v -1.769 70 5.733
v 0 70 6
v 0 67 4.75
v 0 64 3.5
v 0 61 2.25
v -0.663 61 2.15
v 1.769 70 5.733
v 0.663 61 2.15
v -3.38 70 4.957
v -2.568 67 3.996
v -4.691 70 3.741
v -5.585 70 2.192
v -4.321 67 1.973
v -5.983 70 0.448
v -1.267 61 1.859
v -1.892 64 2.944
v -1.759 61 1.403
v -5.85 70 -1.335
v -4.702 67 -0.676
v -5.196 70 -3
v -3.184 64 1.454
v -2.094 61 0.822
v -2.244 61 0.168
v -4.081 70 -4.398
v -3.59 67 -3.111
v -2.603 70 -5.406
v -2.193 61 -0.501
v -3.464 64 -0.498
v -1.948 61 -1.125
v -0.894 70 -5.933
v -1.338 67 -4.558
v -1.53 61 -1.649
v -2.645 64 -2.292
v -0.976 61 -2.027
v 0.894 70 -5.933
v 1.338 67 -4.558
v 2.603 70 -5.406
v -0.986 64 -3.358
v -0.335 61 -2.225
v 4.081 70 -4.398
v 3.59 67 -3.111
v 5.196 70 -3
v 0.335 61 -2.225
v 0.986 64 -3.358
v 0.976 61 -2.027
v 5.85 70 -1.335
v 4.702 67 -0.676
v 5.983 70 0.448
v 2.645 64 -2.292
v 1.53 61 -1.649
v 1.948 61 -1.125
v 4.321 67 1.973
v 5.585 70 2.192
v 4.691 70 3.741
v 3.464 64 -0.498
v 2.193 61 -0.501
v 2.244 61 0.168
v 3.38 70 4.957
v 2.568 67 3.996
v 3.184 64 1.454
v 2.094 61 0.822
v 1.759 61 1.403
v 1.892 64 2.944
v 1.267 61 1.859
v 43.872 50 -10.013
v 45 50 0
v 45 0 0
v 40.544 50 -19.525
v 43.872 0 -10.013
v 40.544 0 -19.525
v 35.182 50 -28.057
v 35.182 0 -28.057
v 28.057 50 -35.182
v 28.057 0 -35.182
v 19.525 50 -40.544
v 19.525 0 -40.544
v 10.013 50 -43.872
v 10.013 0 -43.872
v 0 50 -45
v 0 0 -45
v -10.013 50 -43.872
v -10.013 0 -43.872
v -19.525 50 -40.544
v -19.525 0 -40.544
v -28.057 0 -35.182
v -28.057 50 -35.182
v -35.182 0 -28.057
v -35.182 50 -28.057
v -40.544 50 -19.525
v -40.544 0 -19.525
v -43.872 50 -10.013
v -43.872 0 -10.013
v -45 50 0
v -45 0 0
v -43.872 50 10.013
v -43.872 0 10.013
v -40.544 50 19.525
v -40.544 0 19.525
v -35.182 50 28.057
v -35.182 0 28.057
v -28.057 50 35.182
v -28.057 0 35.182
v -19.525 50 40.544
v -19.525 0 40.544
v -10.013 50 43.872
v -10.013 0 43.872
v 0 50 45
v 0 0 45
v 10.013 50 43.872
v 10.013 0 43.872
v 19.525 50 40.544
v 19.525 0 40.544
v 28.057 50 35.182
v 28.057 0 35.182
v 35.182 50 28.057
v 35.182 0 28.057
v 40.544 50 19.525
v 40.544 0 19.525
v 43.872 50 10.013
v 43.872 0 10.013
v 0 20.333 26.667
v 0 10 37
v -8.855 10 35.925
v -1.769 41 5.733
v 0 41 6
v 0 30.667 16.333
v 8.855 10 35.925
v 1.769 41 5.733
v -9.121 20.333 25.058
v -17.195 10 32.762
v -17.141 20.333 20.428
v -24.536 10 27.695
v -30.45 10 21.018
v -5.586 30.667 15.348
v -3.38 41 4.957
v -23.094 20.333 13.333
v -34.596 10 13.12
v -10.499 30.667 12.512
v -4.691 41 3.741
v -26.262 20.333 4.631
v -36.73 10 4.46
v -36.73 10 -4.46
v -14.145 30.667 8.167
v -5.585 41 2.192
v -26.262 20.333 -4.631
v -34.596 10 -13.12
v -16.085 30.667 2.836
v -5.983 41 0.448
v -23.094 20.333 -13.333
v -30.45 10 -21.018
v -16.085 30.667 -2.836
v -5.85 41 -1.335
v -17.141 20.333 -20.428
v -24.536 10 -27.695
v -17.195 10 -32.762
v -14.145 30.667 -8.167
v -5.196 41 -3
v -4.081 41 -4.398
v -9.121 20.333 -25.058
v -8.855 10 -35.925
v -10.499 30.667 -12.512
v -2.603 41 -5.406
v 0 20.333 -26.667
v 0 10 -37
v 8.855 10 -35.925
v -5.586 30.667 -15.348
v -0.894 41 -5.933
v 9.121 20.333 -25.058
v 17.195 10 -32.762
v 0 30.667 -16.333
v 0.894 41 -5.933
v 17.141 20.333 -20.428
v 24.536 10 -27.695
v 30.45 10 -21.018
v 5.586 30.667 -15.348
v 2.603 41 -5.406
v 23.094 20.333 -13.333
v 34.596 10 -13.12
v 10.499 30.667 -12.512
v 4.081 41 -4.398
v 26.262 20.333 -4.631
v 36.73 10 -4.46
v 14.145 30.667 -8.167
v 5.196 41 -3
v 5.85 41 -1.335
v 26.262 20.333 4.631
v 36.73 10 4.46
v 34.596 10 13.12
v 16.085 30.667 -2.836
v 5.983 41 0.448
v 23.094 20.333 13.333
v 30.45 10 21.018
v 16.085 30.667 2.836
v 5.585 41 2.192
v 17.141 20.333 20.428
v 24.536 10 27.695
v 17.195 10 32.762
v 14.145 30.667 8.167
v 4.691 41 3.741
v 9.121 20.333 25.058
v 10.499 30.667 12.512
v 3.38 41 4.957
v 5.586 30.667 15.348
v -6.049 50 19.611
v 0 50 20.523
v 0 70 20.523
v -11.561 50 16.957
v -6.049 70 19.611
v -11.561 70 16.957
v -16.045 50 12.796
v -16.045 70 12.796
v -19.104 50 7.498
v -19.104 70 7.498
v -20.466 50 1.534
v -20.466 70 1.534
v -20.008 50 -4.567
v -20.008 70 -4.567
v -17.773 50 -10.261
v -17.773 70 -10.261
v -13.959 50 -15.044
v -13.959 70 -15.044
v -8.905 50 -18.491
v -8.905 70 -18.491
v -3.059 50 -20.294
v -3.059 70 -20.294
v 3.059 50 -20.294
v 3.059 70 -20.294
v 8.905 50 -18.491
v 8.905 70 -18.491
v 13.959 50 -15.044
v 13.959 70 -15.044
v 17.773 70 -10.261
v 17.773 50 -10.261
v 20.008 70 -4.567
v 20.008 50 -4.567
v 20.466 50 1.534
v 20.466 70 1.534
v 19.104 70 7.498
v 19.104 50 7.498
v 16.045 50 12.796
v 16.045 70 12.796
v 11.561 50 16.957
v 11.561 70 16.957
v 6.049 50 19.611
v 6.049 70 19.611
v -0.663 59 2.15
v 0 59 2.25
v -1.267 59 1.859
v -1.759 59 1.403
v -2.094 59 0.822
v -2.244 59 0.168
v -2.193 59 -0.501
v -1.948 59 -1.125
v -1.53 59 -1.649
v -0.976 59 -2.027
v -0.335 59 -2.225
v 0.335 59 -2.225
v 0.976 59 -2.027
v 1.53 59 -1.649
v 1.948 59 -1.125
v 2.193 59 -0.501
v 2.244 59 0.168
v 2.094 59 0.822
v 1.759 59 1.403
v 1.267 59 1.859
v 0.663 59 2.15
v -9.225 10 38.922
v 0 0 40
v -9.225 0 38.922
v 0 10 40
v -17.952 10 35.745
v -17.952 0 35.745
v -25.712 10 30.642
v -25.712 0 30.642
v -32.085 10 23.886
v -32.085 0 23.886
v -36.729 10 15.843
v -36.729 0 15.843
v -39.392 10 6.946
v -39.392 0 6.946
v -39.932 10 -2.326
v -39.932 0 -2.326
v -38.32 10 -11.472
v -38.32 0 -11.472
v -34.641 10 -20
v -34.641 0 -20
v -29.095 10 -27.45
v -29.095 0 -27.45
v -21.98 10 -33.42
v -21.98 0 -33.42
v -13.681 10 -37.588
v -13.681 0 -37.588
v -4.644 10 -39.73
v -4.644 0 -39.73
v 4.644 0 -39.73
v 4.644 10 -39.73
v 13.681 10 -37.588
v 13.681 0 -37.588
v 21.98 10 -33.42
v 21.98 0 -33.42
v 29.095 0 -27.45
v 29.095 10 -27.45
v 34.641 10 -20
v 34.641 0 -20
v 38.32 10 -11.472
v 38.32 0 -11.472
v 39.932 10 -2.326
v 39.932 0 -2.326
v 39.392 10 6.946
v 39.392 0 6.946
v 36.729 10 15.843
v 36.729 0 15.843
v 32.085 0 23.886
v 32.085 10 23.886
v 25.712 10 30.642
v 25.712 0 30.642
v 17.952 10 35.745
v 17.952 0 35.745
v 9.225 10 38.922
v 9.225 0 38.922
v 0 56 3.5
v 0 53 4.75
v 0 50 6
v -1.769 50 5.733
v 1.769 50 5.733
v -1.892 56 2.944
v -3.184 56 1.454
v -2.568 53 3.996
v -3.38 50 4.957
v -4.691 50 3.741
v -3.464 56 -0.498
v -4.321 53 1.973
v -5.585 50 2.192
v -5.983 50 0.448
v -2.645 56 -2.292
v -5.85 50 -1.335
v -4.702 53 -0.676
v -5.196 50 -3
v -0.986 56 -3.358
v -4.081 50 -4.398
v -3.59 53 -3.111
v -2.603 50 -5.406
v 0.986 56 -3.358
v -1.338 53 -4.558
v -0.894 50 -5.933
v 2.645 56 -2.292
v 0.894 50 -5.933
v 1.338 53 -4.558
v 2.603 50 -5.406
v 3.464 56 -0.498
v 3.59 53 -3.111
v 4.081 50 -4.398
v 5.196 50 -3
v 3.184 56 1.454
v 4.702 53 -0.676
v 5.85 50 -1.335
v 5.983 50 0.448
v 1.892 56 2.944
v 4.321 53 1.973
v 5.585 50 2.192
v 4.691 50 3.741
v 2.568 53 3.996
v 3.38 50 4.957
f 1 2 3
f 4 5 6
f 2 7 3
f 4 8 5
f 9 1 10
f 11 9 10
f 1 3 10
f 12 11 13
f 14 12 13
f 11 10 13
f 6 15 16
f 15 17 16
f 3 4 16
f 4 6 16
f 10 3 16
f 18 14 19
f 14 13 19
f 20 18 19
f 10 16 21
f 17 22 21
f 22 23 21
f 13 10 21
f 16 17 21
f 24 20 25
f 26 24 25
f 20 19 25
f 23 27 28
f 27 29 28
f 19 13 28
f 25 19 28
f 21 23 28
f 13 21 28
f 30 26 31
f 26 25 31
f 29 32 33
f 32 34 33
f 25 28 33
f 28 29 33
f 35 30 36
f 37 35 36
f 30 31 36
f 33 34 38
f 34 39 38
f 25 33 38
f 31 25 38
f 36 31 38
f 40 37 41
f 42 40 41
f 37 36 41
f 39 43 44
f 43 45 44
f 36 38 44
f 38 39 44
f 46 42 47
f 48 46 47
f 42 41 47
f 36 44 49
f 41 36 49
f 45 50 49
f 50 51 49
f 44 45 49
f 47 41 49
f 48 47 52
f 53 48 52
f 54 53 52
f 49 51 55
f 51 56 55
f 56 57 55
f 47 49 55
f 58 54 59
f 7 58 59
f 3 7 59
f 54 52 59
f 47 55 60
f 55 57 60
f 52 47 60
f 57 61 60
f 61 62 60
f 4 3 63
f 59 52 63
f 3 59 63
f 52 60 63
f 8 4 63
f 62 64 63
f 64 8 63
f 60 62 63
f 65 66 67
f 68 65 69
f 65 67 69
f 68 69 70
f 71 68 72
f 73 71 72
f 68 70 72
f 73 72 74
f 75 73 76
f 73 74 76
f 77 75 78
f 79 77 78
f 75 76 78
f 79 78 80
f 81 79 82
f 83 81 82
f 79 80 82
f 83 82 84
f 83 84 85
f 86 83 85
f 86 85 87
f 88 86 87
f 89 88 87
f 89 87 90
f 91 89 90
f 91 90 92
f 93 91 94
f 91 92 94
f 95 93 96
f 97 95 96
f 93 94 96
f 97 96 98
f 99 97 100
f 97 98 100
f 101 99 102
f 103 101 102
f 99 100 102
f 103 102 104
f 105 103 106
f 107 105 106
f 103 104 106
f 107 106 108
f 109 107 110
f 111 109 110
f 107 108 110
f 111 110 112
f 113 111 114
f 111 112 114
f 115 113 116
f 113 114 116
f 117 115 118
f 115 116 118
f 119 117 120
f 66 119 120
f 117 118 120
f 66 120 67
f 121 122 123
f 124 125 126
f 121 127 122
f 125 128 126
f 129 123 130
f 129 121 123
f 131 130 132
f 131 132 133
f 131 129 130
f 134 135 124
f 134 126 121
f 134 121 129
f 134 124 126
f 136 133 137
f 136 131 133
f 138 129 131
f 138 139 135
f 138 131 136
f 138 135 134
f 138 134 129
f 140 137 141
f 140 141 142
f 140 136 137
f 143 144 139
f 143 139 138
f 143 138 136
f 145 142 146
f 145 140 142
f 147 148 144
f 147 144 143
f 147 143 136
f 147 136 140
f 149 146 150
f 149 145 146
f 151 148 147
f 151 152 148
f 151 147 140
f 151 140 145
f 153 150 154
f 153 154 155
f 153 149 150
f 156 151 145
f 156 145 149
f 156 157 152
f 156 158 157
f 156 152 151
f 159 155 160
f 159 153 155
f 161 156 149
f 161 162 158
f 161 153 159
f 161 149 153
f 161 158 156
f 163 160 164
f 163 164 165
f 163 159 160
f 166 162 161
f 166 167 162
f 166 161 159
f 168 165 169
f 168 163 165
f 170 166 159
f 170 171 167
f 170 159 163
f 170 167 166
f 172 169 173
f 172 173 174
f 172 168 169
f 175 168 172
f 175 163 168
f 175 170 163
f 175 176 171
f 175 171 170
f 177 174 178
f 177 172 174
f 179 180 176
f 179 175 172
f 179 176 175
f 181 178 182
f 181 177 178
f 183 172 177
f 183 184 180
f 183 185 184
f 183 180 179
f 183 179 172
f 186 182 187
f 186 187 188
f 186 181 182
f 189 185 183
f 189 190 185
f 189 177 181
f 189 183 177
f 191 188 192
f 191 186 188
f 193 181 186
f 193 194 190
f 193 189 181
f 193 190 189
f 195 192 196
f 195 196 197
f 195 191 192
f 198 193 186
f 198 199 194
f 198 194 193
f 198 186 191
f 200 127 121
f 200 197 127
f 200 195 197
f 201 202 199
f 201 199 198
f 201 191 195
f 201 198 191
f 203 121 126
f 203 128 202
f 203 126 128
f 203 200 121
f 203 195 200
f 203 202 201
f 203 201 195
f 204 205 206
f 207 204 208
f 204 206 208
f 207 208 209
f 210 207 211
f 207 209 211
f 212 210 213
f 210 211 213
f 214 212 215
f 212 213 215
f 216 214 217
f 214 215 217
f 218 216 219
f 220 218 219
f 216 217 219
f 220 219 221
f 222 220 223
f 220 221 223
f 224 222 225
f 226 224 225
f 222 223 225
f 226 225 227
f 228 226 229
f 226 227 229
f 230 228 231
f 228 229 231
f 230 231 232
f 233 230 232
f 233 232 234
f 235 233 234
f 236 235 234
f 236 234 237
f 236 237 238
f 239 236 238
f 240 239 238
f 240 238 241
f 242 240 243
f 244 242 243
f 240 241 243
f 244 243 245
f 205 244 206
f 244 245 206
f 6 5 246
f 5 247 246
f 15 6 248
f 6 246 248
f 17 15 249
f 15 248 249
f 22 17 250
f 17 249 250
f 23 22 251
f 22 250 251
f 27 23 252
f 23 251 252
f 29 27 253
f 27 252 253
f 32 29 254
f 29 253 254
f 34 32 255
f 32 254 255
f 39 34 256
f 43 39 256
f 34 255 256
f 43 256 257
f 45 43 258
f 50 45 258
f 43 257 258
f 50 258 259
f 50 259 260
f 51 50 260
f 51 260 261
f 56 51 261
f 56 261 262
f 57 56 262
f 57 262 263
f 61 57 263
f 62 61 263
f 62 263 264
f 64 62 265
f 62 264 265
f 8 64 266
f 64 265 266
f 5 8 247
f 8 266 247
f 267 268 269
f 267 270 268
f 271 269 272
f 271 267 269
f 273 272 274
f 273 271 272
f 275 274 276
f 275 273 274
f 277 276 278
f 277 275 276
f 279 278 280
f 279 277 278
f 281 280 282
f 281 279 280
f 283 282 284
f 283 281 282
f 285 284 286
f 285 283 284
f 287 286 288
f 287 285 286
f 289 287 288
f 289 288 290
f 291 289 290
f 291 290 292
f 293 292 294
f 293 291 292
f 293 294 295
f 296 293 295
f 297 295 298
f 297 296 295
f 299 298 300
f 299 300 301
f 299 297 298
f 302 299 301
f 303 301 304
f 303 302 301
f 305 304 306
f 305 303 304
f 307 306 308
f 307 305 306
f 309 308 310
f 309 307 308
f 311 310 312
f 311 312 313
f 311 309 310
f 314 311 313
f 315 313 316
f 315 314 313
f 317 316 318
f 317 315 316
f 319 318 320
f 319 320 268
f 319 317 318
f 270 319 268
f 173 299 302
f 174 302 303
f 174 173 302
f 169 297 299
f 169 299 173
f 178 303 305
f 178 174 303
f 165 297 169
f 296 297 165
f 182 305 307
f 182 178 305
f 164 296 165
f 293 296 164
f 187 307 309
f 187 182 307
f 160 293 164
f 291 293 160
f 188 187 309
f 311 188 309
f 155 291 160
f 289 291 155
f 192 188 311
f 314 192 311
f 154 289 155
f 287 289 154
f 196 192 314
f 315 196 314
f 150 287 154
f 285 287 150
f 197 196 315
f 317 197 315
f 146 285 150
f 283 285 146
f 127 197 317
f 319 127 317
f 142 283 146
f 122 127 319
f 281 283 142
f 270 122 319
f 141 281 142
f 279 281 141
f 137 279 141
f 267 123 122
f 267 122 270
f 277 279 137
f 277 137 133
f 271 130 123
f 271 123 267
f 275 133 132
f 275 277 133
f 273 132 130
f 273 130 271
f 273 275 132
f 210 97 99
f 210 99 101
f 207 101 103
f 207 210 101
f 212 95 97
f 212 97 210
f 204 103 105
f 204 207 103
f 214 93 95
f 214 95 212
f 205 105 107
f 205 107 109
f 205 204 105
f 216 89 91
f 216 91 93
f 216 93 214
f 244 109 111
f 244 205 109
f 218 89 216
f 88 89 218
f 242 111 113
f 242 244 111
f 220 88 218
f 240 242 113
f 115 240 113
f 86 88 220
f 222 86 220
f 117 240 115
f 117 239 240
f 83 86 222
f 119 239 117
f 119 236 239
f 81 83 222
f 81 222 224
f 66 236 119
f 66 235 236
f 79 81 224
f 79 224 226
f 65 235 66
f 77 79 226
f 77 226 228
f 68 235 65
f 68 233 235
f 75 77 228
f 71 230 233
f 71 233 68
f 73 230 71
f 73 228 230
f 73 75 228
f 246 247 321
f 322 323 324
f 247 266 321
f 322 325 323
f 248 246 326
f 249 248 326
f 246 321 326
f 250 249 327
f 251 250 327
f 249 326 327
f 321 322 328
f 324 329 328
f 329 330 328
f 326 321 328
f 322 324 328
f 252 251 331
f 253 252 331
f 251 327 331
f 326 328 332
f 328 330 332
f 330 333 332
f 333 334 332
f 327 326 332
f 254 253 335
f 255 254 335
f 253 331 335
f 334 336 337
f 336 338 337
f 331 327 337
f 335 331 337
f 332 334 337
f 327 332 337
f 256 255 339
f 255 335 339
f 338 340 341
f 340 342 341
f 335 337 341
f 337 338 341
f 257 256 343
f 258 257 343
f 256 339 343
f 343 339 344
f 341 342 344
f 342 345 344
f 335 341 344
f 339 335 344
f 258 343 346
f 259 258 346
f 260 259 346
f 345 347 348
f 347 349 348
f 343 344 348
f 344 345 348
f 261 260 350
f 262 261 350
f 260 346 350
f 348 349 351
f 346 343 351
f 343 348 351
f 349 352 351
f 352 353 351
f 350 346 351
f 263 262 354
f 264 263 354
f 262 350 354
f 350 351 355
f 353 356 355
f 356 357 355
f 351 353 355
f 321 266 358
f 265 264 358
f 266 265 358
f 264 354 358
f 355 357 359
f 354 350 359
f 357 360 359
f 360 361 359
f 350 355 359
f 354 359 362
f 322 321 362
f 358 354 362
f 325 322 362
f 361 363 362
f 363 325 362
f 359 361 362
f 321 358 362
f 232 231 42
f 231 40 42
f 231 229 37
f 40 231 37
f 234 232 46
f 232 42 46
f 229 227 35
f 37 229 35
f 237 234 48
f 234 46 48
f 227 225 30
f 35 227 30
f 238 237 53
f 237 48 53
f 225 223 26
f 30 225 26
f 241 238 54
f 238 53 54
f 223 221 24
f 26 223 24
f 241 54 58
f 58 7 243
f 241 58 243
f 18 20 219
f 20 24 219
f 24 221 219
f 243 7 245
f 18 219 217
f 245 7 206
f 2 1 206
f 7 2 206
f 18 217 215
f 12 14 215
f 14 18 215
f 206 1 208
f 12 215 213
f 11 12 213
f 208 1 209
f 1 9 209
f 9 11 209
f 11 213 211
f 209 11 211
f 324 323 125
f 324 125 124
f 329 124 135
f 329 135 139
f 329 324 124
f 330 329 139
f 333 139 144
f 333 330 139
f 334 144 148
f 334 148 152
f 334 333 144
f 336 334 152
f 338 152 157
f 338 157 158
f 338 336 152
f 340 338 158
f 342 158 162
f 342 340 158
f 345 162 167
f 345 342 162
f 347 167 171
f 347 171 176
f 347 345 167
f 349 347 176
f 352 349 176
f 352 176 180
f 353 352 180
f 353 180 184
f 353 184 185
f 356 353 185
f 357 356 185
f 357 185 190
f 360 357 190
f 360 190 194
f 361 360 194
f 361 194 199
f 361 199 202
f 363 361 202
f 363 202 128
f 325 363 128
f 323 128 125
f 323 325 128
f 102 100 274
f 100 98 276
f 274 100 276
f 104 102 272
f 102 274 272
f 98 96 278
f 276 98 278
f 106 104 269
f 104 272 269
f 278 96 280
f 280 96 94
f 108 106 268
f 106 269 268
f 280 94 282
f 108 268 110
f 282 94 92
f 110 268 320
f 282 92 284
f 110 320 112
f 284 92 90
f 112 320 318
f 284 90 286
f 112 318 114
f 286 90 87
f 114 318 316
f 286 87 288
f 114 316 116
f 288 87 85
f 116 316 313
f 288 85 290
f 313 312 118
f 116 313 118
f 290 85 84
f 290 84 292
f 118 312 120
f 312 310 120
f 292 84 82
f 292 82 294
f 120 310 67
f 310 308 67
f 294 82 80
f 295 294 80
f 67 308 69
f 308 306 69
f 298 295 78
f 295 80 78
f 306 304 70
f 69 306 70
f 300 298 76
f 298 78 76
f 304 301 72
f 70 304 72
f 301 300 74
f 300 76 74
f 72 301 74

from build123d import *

# Parameters (mm, degrees)
SKETCH1_R           = 45
BOSS_EXTRUDE1_DEPTH = 50


with BuildPart() as part:
    # Sketch1 → Boss-Extrude1 (new body)
    with BuildSketch(Plane(origin=(0, 0, 0), x_dir=(1, 0, 0), z_dir=(0, 1, 0))):
        Circle(SKETCH1_R)
    extrude(amount=BOSS_EXTRUDE1_DEPTH)

    # Sketch2 → Cut-Revolve1 (revolve, cut)
    with BuildSketch(Plane(origin=(0, 0, 0), x_dir=(0, 0, -1), z_dir=(1, 0, 0))):
        Polygon((0, 50), (0, 0), (-40, 0), (-40, 10), (-37, 10), (-6, 41), (-6, 50), align=None)
    revolve(axis=Axis((0, 50, 0), (0, -1, 0)), mode=Mode.SUBTRACT)

    # Sketch3 → Revolve1 (revolve)
    with BuildSketch(Plane(origin=(0, 0, 0), x_dir=(0, 0, -1), z_dir=(1, 0, 0))):
        Polygon((-6, 50), (-20.522939955, 50), (-20.522939955, 70), (-6, 70), (-2.249869877, 61), (-2.249869877, 59), align=None)
    revolve(axis=Axis((0, 70, 0), (0, -1, 0)))


solid = part.part
